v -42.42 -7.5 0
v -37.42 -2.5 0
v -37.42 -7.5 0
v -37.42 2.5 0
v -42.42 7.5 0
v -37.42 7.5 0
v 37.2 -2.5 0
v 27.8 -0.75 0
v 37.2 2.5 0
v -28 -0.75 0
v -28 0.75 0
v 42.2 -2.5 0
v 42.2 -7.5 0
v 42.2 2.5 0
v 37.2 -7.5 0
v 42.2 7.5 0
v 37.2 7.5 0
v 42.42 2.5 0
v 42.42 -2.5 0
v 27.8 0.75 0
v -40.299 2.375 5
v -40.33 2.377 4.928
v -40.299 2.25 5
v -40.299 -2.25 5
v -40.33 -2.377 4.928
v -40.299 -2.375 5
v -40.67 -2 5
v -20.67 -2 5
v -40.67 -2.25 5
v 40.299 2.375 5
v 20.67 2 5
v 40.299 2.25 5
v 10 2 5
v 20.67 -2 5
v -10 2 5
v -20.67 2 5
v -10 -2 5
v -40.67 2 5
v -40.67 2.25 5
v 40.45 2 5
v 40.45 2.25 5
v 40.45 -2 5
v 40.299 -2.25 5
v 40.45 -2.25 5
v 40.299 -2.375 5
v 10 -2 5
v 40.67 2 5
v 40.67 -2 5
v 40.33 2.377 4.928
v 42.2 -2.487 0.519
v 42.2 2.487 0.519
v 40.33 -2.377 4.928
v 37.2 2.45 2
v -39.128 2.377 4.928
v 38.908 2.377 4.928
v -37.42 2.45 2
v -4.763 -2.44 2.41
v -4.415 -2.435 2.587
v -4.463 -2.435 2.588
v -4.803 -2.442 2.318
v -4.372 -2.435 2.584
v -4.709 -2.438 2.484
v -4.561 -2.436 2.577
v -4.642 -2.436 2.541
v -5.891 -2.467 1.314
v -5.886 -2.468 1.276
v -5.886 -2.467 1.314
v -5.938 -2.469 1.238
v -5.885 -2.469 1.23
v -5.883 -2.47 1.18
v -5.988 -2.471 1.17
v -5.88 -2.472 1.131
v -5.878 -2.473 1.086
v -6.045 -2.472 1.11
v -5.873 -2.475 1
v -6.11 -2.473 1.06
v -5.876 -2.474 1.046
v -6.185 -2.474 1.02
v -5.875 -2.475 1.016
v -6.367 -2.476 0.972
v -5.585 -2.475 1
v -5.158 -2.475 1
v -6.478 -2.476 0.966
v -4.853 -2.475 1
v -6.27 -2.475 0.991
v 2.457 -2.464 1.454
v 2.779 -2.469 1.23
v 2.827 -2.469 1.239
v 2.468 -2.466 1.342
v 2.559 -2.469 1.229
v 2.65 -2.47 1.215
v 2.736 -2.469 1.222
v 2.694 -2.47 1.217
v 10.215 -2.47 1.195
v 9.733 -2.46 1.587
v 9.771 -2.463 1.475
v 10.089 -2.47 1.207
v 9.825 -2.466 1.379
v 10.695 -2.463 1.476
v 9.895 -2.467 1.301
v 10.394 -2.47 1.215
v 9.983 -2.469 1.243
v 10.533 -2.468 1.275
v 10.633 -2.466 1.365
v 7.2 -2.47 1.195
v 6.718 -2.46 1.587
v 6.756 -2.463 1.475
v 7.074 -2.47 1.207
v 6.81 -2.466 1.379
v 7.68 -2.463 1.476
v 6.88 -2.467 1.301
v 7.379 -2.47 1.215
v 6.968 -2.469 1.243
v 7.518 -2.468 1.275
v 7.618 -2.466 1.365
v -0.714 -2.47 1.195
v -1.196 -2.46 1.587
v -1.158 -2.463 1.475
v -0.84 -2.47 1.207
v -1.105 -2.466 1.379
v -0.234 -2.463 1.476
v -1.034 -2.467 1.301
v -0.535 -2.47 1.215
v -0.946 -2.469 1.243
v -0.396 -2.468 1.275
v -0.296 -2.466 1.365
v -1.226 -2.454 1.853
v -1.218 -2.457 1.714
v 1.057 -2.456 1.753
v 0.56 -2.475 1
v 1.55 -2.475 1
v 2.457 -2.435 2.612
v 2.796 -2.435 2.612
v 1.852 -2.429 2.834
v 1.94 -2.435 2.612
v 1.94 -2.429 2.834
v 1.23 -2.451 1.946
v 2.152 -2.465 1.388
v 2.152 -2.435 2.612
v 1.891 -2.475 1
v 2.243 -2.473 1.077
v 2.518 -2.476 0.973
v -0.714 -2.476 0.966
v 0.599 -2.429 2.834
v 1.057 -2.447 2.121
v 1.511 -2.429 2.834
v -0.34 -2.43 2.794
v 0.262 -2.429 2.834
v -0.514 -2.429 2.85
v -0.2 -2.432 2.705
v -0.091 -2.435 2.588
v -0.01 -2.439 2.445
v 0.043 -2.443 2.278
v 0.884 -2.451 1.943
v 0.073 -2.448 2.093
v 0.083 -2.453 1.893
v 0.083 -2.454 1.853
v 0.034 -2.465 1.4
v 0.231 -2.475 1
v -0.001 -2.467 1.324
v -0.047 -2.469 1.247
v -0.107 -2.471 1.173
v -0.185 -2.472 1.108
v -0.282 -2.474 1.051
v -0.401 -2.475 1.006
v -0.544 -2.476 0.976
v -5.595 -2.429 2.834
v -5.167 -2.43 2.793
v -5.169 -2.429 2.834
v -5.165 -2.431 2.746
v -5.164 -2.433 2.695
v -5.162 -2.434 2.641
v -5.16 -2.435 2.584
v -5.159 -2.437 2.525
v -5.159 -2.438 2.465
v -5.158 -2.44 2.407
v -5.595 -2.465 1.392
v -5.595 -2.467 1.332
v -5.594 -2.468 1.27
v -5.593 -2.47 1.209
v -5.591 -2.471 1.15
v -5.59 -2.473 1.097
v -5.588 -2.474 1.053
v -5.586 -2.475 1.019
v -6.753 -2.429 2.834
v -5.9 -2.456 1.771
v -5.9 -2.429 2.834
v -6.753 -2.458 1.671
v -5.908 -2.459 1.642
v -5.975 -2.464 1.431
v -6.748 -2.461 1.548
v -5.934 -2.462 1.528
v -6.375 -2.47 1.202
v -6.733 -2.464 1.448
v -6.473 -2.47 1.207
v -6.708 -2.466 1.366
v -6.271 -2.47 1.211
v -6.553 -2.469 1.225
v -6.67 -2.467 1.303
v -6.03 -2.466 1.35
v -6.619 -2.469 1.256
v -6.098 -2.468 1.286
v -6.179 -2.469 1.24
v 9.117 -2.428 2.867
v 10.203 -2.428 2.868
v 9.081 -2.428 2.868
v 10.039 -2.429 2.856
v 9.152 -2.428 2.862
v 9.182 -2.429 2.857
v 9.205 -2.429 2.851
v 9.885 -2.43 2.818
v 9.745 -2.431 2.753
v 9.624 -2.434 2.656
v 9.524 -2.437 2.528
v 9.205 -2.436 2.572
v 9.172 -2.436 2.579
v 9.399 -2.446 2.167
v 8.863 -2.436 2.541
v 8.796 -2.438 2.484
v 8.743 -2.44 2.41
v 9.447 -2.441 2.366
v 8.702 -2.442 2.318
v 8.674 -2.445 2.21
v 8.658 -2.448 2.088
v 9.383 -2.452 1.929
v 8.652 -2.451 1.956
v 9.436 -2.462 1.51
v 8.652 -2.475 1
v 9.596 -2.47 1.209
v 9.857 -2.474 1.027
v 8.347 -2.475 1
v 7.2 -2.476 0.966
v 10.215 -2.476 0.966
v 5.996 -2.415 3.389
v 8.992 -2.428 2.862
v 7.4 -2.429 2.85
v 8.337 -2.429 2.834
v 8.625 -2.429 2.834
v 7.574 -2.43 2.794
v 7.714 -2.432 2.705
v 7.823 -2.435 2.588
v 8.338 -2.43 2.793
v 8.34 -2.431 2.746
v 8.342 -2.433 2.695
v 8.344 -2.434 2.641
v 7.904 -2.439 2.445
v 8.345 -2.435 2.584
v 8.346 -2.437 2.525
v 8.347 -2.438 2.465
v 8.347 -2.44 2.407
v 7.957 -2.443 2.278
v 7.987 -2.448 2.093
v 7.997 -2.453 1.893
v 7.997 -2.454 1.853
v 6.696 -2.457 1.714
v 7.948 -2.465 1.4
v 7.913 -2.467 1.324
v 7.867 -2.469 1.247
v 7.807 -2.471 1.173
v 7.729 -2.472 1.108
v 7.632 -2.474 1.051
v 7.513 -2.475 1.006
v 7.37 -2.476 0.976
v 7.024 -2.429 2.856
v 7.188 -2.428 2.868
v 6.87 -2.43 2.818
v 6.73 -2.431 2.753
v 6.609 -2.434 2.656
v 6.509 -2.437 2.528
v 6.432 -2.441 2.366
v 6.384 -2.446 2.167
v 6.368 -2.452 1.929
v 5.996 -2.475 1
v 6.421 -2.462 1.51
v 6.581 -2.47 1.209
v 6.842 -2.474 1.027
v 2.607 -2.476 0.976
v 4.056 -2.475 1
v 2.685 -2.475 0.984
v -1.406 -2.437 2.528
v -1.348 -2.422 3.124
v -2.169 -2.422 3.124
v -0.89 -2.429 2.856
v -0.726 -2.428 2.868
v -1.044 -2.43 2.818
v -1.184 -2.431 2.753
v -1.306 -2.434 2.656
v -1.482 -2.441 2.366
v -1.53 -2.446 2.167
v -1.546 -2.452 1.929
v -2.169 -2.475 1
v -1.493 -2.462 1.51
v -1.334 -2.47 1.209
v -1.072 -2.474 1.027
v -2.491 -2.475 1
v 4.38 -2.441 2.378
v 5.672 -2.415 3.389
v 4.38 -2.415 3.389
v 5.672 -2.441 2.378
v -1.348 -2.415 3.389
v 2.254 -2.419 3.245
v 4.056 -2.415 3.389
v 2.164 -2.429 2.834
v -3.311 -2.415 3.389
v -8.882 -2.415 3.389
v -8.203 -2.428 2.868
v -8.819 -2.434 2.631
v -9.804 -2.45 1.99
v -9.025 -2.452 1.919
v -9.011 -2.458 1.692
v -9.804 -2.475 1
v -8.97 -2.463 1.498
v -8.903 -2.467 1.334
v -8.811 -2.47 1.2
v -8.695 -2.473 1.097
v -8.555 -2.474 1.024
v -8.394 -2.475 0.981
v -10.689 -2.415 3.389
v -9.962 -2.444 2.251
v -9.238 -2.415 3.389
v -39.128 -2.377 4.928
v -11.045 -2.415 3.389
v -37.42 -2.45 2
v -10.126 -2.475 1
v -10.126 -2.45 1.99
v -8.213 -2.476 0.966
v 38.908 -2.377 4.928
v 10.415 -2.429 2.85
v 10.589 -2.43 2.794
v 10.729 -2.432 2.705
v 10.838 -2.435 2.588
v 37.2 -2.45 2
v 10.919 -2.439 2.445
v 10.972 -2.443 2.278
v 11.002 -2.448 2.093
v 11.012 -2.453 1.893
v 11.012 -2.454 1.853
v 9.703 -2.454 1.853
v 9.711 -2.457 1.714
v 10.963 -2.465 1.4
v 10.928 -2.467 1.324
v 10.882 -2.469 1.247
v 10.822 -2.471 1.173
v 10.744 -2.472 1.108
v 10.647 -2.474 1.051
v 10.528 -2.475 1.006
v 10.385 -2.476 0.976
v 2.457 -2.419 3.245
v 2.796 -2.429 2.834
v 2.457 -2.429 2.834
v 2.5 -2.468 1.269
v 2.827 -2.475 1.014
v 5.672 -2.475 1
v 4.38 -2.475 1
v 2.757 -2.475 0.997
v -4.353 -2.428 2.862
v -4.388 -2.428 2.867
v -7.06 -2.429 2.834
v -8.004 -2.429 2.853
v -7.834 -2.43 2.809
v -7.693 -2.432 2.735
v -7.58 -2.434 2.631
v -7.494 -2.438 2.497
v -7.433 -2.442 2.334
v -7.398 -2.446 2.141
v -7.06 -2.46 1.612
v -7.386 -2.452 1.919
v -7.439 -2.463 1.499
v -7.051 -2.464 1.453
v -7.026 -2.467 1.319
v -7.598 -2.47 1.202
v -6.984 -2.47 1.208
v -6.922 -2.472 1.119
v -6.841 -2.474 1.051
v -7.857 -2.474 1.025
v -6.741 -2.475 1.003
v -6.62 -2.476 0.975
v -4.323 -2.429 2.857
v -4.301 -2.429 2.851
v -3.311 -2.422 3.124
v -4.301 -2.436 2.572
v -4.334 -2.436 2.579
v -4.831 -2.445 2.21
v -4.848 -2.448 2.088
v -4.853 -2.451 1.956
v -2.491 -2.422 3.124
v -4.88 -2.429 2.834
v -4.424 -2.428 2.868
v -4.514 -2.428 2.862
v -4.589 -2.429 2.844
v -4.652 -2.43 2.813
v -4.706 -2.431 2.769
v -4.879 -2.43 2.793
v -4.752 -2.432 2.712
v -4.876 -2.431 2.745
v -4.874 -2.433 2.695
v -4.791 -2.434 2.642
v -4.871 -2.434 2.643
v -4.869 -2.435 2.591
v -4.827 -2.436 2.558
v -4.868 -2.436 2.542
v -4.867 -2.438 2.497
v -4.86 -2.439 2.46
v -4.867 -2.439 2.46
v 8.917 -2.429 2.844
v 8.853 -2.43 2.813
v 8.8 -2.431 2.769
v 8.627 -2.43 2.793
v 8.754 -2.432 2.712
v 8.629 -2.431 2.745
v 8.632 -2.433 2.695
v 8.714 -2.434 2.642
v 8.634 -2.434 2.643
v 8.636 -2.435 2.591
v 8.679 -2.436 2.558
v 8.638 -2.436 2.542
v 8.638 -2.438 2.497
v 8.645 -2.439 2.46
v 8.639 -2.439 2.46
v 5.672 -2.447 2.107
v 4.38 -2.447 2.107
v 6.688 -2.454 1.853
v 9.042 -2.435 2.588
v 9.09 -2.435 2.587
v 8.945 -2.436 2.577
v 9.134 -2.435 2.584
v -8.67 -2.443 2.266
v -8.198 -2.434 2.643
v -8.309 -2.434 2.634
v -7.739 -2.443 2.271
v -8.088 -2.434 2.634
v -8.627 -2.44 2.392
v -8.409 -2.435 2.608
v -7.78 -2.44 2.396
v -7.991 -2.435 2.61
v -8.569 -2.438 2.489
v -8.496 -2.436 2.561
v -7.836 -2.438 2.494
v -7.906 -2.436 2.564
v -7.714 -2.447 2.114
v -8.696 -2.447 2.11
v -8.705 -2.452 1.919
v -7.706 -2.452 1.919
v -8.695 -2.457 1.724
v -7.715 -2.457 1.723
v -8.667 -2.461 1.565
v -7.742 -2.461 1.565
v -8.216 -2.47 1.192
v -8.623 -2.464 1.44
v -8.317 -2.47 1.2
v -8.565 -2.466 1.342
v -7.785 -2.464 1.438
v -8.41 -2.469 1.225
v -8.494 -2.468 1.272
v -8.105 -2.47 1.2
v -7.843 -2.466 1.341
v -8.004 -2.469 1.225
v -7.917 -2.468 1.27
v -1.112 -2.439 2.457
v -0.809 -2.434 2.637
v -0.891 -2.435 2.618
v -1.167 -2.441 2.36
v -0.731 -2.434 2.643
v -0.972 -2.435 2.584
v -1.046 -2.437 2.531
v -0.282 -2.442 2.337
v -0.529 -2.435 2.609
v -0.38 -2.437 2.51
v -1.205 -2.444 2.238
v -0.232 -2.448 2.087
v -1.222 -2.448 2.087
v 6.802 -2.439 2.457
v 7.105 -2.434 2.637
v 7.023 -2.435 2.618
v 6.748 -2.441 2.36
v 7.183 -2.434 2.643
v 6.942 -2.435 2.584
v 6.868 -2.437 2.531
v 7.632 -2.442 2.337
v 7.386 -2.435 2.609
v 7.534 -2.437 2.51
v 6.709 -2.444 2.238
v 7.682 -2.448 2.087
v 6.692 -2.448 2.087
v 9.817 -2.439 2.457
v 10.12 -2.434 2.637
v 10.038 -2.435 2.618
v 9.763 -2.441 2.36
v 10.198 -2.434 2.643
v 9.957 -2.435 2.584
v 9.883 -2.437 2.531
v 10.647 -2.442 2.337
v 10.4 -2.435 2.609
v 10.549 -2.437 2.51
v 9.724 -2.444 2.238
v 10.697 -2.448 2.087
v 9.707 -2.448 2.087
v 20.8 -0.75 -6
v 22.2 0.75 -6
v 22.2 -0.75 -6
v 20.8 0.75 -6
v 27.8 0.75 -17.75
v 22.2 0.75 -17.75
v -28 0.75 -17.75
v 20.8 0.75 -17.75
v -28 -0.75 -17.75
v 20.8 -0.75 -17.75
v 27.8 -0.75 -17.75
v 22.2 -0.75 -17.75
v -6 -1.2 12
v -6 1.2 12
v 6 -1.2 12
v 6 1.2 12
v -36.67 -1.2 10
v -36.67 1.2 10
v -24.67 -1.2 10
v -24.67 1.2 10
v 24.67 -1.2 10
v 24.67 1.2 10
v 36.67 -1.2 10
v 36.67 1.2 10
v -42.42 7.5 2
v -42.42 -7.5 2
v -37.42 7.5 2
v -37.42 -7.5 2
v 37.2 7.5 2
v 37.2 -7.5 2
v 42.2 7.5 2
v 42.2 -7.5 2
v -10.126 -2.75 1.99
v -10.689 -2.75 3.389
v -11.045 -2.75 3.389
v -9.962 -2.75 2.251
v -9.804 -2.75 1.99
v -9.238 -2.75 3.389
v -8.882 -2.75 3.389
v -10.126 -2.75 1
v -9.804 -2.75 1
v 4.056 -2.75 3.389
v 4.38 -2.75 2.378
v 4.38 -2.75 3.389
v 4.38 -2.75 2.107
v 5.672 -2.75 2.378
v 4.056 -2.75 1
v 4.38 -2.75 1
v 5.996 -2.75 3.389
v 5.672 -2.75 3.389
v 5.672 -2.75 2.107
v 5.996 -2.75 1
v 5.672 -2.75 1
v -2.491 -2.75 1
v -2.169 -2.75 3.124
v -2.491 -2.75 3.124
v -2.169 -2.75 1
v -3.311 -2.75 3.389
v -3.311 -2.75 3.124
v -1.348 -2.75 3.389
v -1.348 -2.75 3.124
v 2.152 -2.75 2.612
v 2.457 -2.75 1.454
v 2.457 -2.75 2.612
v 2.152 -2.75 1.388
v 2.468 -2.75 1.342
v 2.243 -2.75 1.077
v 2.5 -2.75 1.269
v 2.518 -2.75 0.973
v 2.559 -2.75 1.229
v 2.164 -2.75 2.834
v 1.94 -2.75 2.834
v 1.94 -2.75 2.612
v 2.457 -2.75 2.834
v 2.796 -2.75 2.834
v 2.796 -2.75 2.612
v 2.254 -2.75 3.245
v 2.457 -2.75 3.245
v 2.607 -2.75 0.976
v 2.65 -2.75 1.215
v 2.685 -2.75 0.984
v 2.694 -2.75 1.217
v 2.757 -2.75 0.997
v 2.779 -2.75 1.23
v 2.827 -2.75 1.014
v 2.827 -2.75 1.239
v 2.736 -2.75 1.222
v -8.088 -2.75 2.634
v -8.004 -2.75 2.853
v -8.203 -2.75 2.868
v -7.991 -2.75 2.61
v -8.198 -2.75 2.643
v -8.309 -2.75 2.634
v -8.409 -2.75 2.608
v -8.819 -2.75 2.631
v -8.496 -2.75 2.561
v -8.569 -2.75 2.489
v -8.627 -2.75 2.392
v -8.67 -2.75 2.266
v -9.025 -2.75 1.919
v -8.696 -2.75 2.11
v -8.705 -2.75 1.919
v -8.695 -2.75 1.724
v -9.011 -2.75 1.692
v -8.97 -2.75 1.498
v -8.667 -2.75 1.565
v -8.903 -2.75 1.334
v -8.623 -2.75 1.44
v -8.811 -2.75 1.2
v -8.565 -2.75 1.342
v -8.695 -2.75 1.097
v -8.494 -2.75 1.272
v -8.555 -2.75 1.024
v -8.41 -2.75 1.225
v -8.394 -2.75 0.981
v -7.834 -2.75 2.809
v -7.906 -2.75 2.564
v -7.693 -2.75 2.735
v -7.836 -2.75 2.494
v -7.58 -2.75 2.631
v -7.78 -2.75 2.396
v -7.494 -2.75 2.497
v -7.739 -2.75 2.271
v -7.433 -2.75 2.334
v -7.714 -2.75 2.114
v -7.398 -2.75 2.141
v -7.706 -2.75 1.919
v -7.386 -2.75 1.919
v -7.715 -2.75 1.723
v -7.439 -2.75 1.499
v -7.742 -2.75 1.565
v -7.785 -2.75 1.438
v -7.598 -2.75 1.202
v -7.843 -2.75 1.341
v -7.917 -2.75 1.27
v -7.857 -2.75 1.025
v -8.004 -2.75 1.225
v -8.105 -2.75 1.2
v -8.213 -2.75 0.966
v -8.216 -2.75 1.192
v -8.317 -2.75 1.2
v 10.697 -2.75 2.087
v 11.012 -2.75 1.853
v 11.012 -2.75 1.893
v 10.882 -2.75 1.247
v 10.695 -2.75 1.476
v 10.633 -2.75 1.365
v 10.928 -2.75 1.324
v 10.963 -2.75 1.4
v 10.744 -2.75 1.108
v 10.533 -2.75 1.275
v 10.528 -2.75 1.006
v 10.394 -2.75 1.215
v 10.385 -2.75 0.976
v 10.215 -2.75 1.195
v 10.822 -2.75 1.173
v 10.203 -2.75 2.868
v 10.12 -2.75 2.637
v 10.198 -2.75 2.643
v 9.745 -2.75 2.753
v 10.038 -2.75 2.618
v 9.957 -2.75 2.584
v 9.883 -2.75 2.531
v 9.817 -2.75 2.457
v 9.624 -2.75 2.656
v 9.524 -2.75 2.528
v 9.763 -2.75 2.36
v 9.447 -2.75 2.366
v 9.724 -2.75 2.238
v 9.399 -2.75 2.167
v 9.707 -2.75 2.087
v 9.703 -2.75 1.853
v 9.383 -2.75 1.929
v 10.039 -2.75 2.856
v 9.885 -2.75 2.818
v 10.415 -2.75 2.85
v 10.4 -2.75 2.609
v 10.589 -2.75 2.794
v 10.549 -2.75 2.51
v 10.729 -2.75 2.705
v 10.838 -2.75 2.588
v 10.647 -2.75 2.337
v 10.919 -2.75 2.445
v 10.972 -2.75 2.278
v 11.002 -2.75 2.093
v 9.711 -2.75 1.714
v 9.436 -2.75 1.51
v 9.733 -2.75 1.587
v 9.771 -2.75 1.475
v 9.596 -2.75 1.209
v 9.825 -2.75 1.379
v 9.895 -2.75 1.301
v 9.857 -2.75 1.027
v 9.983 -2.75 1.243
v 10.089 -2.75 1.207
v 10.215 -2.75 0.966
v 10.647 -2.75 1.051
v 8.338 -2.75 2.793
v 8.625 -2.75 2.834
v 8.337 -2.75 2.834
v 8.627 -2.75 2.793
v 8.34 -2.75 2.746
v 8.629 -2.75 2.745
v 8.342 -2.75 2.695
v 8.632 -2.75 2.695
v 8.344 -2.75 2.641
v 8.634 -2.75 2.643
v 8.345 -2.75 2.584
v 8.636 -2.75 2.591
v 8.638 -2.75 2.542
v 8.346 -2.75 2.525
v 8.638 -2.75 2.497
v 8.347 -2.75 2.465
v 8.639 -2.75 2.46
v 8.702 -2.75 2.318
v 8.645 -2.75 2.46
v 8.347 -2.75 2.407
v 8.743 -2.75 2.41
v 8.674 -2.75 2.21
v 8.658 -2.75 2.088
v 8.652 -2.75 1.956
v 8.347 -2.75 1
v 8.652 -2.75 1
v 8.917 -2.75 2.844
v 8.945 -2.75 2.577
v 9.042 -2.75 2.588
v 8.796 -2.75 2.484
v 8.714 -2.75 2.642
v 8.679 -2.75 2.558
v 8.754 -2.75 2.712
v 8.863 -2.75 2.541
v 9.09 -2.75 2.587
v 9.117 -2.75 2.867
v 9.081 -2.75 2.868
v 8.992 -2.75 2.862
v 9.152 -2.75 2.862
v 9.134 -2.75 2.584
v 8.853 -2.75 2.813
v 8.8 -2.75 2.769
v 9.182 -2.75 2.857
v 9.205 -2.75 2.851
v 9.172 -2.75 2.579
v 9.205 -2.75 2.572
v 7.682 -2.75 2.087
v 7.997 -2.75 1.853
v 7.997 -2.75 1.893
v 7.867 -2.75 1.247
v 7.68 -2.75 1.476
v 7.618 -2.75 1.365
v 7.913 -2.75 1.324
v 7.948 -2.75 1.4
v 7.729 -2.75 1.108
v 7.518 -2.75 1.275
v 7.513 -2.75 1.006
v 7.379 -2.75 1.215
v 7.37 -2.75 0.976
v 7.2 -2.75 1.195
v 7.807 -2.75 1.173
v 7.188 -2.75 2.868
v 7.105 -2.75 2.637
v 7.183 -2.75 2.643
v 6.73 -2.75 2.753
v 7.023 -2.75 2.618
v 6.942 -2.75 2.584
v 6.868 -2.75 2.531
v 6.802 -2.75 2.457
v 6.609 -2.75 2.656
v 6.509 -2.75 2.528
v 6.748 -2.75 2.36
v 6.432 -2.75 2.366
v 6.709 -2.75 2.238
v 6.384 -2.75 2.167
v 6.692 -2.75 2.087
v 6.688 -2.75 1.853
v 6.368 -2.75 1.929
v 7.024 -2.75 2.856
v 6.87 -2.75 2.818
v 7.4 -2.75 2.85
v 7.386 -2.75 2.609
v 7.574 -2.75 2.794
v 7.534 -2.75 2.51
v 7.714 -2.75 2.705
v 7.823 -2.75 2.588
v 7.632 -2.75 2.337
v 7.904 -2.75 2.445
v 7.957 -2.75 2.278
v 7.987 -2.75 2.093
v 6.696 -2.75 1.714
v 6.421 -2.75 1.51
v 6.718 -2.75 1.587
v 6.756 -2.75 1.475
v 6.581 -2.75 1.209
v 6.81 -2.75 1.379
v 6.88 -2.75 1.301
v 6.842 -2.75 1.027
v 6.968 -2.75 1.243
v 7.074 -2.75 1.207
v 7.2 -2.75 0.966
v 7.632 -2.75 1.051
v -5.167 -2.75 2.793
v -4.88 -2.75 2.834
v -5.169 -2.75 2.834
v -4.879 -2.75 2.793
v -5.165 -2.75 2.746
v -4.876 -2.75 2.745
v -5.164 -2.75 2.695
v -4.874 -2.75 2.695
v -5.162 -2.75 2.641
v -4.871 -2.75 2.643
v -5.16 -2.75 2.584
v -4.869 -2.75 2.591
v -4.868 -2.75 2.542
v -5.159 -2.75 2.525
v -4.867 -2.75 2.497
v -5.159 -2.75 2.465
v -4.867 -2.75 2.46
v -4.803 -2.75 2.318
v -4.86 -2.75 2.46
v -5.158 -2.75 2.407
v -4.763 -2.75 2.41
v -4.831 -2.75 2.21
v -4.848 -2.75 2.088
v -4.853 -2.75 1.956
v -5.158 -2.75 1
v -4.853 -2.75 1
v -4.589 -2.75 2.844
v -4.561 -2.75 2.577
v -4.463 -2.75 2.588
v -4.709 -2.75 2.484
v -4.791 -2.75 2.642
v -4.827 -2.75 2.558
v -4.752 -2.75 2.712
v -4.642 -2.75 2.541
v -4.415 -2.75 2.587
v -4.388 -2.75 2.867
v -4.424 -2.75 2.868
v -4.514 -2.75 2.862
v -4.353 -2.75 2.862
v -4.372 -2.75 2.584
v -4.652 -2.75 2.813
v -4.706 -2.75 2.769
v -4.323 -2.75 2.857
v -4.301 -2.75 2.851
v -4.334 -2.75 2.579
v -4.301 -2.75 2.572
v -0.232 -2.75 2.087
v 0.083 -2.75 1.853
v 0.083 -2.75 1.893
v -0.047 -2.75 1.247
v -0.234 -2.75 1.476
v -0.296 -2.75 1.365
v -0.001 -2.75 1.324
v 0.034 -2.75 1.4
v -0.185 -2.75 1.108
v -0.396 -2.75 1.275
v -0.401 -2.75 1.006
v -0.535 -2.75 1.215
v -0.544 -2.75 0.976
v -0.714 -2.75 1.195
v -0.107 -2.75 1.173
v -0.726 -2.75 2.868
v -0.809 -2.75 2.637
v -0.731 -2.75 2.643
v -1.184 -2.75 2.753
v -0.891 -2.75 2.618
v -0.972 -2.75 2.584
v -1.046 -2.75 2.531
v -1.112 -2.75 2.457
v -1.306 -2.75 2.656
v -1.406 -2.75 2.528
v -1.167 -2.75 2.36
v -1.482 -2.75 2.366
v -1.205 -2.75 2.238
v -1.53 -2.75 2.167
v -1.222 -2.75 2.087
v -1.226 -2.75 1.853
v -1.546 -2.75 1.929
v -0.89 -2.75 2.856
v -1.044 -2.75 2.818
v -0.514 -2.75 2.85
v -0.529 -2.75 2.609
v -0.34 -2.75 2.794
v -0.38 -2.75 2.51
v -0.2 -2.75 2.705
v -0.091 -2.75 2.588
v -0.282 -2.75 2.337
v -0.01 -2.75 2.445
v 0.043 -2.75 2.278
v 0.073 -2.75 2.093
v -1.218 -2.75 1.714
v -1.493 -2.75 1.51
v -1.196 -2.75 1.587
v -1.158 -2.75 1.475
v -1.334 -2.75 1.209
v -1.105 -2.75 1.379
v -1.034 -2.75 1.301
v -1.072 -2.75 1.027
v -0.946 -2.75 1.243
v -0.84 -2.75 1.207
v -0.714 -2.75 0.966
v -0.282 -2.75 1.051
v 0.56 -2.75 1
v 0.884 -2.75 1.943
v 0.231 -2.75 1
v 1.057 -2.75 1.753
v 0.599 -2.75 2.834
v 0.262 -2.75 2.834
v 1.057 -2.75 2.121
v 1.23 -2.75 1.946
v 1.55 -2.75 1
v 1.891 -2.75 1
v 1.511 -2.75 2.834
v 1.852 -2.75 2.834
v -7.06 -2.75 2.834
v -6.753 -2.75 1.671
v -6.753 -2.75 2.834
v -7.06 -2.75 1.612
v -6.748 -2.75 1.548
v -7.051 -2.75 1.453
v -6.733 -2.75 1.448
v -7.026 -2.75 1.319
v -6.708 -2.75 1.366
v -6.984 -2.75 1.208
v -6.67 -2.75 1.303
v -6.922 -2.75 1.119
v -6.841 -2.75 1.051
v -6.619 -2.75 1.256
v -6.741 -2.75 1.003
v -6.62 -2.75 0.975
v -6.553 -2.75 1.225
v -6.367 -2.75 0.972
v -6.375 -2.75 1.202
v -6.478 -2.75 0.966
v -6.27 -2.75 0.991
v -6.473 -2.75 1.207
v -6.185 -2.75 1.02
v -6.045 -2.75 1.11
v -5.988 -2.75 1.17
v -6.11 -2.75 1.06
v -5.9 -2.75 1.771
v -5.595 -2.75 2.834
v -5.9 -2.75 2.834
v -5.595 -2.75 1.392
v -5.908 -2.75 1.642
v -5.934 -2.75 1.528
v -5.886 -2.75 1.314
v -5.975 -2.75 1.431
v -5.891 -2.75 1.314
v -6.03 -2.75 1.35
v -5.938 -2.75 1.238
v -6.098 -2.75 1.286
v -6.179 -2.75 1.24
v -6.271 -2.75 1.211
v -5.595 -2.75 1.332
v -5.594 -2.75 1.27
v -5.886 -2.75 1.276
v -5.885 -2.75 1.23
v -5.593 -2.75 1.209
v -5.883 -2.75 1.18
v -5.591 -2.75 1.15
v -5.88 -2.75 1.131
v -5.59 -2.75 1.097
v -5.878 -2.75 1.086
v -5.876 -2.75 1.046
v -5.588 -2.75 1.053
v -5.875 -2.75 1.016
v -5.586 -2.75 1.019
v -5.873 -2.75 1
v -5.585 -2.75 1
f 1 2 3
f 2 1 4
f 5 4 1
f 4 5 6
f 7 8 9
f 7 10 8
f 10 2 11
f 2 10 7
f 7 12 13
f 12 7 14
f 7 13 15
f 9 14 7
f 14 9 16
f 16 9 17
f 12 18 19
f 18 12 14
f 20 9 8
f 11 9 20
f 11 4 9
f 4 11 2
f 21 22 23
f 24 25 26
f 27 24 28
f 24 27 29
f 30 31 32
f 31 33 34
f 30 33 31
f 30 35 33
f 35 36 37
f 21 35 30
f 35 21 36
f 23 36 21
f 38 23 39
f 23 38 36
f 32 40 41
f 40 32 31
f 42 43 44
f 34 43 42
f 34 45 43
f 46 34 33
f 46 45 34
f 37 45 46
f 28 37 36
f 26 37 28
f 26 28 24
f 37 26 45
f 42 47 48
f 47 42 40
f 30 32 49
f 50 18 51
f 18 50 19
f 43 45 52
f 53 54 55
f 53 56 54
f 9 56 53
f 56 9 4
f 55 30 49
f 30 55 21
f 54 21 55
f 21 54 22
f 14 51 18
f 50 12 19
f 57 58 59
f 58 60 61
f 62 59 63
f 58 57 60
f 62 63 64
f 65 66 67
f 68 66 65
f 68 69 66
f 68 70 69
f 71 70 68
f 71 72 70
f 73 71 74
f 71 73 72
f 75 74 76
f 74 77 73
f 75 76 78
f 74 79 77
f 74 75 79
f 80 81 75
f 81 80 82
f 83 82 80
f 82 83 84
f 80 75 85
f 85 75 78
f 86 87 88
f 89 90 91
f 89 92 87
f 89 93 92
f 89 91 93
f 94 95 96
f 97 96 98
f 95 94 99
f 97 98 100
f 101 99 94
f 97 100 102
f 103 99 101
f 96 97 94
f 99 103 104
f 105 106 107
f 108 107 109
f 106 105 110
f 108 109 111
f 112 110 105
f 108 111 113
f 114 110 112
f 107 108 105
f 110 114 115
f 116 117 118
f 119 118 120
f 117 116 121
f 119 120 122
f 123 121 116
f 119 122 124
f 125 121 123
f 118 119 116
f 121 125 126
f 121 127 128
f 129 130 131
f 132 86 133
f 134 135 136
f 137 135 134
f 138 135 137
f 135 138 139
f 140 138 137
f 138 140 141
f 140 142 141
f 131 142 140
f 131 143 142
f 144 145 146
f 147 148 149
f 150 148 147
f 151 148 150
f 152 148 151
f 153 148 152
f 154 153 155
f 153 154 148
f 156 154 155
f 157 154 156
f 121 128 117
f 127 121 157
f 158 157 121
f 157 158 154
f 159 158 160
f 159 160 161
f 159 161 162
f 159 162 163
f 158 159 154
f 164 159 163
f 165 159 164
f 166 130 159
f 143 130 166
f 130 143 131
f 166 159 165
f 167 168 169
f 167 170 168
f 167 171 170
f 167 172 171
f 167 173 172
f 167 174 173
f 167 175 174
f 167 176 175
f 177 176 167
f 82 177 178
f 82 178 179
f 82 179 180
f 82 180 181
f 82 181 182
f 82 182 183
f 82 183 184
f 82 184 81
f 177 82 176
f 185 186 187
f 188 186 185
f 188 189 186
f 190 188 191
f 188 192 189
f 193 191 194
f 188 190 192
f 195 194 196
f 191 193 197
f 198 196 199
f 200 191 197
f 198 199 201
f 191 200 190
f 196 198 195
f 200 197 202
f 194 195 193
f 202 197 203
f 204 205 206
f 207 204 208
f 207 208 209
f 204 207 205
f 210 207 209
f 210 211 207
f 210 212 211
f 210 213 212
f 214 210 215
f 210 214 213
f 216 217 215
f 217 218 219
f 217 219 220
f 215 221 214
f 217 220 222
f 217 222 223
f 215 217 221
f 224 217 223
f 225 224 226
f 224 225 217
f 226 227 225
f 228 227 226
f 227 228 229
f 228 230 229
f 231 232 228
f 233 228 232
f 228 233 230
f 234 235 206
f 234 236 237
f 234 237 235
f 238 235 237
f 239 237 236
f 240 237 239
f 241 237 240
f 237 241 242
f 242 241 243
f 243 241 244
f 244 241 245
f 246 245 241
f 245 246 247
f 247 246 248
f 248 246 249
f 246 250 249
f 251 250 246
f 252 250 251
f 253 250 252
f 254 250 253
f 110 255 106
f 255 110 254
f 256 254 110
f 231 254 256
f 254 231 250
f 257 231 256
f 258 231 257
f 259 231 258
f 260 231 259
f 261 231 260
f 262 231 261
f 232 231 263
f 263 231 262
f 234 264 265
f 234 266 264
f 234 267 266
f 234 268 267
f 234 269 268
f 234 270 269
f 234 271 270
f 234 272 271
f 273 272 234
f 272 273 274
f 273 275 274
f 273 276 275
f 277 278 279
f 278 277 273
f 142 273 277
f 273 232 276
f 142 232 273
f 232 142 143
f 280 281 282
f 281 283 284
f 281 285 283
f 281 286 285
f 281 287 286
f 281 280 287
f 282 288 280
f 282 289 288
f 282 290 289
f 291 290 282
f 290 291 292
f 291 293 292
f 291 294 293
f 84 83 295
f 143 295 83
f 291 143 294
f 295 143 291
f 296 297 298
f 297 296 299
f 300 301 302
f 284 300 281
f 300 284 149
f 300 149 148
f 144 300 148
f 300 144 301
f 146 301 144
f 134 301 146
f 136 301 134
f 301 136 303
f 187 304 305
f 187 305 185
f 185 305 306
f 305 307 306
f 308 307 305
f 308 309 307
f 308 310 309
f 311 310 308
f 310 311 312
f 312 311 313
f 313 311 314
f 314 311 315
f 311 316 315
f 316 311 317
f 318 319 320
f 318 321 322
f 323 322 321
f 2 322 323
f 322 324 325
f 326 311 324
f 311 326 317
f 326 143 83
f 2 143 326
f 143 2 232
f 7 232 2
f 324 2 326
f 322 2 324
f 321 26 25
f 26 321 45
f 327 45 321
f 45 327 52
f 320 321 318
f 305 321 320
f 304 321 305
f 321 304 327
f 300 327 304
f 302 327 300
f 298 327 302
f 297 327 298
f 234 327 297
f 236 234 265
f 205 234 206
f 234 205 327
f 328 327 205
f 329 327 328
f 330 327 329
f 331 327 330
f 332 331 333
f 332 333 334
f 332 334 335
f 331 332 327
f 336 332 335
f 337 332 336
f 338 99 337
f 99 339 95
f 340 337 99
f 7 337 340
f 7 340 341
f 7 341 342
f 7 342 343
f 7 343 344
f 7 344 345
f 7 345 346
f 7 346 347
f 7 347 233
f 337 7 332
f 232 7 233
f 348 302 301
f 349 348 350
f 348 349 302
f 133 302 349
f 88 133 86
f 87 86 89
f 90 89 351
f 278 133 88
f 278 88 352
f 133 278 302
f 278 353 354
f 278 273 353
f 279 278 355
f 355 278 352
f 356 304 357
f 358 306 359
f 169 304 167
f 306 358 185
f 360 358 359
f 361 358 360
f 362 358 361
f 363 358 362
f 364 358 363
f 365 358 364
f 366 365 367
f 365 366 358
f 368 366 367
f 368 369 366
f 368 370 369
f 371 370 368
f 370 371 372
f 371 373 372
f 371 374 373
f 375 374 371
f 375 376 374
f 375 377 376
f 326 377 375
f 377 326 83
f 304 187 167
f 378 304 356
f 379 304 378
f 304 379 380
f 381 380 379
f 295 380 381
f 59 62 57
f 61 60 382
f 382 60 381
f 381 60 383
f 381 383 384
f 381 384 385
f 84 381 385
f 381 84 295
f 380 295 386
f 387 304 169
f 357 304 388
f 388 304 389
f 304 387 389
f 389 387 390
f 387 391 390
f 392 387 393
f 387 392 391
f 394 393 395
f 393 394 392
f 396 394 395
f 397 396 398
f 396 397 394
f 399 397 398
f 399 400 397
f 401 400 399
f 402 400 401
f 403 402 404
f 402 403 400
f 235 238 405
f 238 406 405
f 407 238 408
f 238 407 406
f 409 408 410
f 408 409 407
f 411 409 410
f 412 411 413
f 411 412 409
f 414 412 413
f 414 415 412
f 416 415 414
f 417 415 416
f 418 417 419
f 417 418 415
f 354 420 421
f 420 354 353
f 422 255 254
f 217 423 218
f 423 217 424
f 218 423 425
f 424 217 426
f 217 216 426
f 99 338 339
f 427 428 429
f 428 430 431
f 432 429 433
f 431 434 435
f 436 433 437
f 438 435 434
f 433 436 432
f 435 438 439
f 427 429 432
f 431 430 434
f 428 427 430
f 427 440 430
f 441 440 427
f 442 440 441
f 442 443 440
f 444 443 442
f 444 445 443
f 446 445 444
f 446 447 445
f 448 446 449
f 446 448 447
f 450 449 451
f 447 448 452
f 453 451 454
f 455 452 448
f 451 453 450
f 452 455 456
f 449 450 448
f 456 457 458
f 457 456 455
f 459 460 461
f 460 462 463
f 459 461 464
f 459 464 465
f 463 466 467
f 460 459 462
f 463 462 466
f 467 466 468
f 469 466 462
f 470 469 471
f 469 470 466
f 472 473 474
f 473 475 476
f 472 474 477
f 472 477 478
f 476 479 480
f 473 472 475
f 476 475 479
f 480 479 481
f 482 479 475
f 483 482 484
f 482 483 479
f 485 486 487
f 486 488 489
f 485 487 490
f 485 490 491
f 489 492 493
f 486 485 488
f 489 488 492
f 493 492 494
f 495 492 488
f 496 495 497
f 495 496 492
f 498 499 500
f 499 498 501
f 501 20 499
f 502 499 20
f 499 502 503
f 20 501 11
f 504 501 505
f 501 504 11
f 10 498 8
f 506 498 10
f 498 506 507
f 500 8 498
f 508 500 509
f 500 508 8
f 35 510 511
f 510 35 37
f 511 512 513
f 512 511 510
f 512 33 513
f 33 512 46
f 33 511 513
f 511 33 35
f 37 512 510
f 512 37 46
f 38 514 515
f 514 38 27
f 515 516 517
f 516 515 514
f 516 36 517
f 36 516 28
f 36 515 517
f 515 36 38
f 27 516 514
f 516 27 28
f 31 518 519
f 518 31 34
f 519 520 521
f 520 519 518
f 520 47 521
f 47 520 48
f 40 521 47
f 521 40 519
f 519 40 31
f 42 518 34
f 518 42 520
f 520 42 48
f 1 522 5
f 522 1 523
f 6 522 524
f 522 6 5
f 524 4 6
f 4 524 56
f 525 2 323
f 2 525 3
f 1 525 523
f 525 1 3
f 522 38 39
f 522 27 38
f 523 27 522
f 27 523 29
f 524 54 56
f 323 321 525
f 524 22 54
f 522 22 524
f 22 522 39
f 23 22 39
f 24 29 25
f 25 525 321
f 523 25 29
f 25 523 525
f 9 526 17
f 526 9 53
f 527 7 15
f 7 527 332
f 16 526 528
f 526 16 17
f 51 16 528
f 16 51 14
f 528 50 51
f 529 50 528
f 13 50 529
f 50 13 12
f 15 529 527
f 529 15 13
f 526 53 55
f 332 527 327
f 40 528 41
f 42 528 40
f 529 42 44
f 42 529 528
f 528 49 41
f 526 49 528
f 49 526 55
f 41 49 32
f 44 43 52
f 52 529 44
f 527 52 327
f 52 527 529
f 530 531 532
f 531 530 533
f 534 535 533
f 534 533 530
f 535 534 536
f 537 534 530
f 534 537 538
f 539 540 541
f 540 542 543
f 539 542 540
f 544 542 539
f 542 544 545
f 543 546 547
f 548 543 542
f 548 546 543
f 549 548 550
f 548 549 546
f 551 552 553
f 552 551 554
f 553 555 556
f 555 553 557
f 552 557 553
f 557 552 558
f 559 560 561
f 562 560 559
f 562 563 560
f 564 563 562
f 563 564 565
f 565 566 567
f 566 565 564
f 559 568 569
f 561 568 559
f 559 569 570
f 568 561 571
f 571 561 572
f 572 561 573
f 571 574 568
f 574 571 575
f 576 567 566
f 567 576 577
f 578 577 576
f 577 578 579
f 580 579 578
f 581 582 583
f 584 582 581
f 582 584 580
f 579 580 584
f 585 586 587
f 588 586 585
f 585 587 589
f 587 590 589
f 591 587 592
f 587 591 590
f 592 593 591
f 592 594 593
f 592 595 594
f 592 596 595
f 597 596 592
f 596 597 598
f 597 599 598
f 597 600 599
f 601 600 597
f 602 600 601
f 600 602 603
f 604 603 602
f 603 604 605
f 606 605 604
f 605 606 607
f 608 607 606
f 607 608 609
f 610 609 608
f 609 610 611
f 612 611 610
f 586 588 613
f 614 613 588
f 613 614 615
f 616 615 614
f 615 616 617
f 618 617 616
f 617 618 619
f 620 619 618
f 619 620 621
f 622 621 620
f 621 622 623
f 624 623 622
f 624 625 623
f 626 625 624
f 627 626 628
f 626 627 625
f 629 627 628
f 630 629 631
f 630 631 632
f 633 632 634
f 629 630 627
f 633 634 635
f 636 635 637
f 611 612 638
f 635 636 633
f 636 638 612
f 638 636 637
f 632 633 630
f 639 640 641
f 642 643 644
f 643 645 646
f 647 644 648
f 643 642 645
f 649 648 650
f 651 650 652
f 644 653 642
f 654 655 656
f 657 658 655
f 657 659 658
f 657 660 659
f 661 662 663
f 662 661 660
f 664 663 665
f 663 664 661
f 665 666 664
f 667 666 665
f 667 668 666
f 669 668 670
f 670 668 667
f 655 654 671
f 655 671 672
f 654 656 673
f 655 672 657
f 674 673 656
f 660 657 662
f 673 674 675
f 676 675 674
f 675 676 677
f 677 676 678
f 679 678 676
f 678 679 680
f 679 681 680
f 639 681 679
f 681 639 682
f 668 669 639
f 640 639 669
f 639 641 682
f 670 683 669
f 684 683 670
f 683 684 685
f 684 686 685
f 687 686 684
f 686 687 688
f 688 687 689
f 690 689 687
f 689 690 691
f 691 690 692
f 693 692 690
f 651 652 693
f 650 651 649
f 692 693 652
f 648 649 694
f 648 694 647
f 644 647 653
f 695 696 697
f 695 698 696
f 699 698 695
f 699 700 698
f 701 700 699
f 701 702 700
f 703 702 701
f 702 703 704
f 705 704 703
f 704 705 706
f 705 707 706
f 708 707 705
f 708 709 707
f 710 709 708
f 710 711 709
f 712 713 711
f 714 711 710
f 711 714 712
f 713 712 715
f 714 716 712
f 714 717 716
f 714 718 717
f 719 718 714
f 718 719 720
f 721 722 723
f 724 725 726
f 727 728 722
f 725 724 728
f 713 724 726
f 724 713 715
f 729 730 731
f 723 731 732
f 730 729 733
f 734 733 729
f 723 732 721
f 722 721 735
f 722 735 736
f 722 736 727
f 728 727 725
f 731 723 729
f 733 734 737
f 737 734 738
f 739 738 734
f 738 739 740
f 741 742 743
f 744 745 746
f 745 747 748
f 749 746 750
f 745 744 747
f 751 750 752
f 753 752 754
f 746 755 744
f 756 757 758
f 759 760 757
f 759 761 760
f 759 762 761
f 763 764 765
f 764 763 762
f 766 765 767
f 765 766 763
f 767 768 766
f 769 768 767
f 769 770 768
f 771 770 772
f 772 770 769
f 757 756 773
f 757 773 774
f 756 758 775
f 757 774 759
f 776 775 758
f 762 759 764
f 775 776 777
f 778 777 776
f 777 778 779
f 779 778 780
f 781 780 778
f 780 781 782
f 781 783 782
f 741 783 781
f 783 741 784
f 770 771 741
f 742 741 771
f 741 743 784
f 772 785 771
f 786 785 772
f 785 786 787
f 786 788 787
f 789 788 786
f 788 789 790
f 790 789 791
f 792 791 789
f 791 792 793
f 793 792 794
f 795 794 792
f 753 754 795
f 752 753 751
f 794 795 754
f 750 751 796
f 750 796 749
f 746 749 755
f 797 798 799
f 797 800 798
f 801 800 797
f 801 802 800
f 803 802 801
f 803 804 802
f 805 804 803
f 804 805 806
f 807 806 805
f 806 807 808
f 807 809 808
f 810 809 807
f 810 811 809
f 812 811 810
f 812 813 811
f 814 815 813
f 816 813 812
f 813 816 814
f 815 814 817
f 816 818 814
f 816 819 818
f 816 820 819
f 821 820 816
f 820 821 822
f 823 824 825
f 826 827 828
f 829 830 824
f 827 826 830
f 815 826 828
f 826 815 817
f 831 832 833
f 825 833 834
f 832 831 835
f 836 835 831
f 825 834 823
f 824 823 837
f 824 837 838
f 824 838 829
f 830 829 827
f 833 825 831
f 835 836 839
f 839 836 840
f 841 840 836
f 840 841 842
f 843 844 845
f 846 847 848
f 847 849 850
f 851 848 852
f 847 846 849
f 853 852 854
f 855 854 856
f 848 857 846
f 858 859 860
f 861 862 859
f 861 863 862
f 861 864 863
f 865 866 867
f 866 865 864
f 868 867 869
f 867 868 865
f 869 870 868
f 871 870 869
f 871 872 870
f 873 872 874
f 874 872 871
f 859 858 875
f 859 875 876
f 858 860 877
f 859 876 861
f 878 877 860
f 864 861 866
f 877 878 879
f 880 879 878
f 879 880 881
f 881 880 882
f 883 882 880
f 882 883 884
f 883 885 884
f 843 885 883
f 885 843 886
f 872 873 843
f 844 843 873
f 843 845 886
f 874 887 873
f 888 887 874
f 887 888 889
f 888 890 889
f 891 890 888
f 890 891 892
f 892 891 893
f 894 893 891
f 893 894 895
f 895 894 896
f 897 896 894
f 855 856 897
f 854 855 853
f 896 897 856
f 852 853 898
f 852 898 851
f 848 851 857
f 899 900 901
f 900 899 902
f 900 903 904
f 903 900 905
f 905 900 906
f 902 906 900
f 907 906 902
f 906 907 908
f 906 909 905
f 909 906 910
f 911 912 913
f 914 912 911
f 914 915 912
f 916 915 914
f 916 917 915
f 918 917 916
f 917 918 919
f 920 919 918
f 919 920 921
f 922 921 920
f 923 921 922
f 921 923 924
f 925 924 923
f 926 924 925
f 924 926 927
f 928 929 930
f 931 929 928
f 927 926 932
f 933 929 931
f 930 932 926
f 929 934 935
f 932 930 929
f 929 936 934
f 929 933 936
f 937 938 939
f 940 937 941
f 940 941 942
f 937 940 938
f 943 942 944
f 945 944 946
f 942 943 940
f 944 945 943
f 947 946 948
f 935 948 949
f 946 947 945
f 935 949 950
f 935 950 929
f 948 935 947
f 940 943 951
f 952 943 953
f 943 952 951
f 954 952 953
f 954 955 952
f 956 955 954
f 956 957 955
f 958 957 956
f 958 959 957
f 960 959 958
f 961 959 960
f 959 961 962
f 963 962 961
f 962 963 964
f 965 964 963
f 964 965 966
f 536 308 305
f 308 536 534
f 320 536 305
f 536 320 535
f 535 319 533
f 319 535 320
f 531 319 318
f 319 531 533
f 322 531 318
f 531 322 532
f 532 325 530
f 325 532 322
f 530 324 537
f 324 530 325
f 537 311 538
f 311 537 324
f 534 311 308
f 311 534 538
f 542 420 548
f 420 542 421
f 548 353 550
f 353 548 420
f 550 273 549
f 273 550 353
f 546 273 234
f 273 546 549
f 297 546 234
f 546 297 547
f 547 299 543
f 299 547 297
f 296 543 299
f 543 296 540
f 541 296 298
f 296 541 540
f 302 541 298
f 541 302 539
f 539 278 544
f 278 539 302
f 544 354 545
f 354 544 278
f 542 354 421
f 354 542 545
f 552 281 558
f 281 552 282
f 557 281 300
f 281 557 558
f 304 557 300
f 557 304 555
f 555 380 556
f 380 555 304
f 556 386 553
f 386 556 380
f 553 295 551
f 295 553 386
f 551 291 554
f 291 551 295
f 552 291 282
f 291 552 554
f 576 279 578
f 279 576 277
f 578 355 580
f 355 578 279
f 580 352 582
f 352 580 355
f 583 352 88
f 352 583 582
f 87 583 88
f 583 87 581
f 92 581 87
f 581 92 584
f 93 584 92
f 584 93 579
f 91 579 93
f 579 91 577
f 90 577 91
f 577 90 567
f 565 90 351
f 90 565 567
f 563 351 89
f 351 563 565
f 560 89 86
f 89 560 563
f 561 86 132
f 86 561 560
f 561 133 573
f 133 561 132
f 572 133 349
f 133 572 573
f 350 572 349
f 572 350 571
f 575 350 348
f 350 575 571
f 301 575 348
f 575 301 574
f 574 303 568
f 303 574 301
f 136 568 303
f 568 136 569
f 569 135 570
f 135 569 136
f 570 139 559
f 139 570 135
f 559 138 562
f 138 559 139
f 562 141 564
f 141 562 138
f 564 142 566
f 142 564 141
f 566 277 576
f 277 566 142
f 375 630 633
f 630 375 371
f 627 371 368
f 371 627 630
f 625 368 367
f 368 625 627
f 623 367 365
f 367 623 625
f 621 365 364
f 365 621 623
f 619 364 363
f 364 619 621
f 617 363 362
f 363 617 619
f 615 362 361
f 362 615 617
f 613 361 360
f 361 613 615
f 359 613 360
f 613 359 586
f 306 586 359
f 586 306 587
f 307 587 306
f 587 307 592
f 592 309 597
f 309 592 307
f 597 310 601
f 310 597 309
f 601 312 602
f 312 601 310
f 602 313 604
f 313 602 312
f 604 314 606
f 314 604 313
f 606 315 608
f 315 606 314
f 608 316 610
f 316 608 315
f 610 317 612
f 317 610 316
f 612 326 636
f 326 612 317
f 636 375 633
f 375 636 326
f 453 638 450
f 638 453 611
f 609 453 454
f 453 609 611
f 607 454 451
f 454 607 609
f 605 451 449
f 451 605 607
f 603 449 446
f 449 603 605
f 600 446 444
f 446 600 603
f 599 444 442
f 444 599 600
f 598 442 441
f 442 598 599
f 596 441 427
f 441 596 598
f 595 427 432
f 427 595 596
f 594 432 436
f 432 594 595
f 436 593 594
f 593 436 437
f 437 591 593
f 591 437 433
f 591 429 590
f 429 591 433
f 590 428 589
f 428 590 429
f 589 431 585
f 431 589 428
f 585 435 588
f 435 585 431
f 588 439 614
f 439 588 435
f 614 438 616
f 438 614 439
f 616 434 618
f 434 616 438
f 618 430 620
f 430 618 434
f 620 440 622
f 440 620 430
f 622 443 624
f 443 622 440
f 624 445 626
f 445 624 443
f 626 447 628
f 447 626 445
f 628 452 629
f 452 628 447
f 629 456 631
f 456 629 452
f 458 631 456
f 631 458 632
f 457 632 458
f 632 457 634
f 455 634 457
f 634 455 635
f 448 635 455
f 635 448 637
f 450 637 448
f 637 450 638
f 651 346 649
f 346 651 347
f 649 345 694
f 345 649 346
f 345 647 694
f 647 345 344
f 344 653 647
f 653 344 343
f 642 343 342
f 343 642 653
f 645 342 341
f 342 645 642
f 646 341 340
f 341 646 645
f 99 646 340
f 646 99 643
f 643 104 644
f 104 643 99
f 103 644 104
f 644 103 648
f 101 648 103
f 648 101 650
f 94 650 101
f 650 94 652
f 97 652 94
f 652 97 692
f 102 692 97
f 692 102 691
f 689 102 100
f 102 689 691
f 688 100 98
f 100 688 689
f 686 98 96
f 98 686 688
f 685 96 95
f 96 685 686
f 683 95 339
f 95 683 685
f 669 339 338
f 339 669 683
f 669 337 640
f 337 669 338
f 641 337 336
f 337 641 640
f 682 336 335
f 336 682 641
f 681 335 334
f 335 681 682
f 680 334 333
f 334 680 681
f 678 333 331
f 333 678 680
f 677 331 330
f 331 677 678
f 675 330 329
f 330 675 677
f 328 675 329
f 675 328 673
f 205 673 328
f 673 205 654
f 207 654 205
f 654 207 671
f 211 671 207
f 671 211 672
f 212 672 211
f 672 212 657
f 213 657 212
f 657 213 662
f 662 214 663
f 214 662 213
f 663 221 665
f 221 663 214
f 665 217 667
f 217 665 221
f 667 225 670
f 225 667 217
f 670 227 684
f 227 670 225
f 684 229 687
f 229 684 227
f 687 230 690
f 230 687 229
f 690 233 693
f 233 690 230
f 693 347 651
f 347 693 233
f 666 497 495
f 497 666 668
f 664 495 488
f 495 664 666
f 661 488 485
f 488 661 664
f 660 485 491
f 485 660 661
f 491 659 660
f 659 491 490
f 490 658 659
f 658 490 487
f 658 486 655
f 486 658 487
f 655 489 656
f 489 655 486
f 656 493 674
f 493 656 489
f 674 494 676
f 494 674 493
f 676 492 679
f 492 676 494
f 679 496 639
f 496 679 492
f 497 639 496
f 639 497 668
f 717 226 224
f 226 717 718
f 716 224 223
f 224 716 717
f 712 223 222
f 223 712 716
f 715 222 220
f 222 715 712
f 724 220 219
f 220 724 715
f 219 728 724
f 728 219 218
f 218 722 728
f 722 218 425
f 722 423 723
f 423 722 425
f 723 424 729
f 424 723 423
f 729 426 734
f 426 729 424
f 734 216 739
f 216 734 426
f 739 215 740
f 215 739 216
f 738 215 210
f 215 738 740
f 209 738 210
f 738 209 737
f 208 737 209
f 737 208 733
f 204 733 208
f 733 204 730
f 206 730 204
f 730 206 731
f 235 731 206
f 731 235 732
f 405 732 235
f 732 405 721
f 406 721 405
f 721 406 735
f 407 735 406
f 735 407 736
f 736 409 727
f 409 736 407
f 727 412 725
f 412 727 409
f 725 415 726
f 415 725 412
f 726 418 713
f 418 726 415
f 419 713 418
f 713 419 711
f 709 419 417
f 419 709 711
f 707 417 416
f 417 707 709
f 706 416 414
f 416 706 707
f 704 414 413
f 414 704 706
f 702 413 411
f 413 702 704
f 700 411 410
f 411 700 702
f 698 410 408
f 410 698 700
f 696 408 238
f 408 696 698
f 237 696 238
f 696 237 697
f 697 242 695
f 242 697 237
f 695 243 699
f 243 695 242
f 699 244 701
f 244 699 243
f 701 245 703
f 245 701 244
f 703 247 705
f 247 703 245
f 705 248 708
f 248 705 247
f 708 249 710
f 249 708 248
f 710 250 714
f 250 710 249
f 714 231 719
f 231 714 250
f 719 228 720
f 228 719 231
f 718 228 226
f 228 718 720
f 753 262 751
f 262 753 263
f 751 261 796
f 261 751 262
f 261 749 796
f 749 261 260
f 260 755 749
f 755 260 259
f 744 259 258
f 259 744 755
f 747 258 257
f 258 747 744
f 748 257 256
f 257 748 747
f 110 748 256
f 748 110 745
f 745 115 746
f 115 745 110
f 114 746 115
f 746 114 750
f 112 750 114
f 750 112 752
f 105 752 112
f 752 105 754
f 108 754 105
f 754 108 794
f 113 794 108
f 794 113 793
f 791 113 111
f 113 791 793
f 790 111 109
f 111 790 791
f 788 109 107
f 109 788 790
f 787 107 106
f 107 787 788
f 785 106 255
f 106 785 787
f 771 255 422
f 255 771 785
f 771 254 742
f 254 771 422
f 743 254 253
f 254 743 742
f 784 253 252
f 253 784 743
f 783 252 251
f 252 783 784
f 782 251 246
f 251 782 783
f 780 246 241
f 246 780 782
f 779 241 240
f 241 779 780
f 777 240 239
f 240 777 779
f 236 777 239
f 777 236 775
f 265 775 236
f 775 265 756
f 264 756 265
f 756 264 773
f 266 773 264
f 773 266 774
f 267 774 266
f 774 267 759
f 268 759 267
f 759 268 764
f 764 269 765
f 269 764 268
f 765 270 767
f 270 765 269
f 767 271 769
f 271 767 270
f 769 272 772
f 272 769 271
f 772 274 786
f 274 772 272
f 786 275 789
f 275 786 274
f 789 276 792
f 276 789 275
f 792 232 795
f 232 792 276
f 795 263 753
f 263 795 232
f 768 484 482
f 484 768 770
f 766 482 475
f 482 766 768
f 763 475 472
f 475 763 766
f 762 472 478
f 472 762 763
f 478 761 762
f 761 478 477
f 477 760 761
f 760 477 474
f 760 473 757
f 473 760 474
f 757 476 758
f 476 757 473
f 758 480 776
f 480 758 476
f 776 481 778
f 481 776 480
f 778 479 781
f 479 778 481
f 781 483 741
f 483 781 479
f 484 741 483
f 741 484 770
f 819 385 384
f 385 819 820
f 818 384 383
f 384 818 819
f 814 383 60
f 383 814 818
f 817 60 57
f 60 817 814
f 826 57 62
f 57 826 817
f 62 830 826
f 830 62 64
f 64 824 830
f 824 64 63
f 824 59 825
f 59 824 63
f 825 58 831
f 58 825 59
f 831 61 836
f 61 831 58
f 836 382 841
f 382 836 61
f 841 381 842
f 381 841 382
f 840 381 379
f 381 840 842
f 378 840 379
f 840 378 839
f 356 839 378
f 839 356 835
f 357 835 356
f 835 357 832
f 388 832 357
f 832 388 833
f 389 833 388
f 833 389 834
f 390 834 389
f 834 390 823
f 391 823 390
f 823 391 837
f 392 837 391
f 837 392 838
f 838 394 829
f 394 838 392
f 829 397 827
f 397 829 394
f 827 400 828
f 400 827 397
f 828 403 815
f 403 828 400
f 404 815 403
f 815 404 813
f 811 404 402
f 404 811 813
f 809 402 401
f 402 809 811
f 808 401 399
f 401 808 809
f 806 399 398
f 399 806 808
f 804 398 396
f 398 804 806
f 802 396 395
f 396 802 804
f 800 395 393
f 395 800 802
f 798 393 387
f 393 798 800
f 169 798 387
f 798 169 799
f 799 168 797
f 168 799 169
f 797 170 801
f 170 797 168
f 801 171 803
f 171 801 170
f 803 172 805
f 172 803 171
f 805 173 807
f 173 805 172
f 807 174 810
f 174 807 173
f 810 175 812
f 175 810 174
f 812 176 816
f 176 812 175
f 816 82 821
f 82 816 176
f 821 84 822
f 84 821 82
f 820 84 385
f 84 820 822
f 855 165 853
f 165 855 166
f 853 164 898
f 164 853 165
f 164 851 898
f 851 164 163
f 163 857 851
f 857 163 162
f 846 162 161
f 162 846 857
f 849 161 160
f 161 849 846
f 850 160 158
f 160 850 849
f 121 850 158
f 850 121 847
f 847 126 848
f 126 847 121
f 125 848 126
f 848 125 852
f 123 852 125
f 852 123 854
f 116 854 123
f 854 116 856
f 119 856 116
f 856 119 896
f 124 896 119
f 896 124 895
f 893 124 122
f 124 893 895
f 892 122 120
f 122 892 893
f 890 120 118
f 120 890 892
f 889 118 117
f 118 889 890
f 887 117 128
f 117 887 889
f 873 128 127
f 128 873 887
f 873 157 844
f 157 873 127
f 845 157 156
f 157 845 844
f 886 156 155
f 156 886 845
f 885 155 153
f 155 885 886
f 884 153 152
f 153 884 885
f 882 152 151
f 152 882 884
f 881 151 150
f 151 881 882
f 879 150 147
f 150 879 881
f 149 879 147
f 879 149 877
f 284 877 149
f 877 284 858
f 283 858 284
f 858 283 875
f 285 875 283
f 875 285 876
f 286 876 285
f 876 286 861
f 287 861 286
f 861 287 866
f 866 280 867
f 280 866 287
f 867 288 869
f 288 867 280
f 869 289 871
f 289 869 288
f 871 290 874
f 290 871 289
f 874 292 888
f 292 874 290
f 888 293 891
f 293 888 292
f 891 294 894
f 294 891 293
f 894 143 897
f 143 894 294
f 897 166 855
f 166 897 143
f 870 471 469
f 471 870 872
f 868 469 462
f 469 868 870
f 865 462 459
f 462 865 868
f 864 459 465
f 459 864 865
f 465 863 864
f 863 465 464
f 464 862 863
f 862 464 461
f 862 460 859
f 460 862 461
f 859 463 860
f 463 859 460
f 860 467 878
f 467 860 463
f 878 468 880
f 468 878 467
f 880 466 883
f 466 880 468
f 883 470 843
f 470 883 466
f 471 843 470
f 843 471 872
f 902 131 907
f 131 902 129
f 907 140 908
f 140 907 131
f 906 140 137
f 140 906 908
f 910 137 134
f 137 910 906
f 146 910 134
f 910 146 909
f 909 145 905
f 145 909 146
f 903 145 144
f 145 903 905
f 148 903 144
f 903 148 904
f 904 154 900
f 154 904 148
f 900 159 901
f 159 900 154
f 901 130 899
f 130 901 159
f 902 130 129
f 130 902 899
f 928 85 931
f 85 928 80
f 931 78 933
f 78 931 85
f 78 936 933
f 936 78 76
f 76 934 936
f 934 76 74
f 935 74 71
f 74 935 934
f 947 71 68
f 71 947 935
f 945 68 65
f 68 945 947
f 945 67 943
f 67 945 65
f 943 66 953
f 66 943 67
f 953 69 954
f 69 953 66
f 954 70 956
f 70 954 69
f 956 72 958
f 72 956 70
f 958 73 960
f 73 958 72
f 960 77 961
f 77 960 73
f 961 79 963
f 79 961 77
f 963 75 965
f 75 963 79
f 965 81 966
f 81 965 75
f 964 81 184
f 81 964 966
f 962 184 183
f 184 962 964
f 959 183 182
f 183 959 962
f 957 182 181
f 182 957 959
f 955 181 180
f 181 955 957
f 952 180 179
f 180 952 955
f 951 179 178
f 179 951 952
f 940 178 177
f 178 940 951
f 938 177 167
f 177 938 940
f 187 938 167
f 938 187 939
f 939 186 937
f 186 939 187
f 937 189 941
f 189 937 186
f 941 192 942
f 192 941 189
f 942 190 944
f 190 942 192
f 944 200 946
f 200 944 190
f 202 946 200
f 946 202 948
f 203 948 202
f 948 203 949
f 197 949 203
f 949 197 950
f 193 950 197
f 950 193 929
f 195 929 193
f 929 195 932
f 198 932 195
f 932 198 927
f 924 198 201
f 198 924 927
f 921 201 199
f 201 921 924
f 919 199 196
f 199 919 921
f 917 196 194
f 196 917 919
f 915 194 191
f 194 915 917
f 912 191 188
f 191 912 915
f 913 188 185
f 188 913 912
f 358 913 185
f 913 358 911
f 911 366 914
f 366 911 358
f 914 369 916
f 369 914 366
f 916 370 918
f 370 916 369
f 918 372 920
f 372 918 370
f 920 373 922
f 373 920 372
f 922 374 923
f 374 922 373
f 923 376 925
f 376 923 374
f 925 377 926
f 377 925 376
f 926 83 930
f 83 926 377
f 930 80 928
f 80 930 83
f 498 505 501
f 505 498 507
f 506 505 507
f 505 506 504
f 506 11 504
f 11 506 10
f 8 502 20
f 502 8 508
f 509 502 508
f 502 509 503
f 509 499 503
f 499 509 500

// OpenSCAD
echo(version=version());
// Parameters used to generate model (Values are measured in mm)

tooth_count = 1; // Number of wells
tooth_width = 48.8; // Width of each tooth
tooth_thickness = 1.5; // Thickness of each tooth
tooth_gap = 1.6; // Spacing between teeth.
tooth_length = 17.75;  // Length of teeth (measured perpendicular from bottom of support)
text_label = "Your Text Here"; // Label or name you want to appear on the side
tooth_support = 6;// Height of upper support on teeth

// Include square blocks on bottom of support
locking_block_supports = "no"; // [yes, no]

//Main block of code
union() {

// Primary support bar
    translate([0, 0, 0])
    linear_extrude(height = 5, scale = 0.95)
    square([body_x, body_y], center = true);

// Teeth support
    translate([0, 0, -tooth_support])
    linear_extrude(height = tooth_support)
    square([55, tooth_thickness], center = true);

//Handles
     // Handle Center
        translate([0, 0, body_z])
        linear_extrude(height = 7, scale = 0.6)
        square([20, 4], center = true);
    // Handle left
        translate([(-body_x/2)+11.75, 0, body_z])
        linear_extrude(height = 5, scale = 0.6)
        square([20, 4], center = true);
    // Handle right
        translate([(body_x/2)-11.75, 0, body_z])
        linear_extrude(height = 5, scale = 0.6)
        square([20, 4], center = true);

// Left support square
	// Support base
        translate([(-body_x/2)+2.5, 0, 0])
    	linear_extrude(height = 2)
    	square([5, 15], center = true);
	// Angled Support
        translate([(-body_x/2)+2.5, 0, 2])
        linear_extrude(height = 3, scale = 0.3)
        square([5, 15], center = true);

// Right support square
	// Support base
        translate([(body_x/2)-support_x, 0, 0])
    	linear_extrude(height = 2)
    	square([5, 15], center = true);
    // Angled Support
        translate([(body_x/2)-support_x, 0, 2])
        linear_extrude(height = 3, scale = 0.3)
        square([5, 15], center = true);

// Text placed on body of comb
    logo(text_label);

// Locking Blocks.
	if(locking_block_supports == "yes")
	{

    // Right
        translate([(body_x/2)-support_x, 0, -support_z]) linear_extrude(height = support_z) square([support_x, support_y], center = false);

    // Left
        translate([-body_x/2, 0, -support_z]) linear_extrude(height = support_z) square([support_x, support_y], center = false);
	}

//Teeth
	translate([(tooth_margin-3.6), 0, -tooth_length/2]) union() {
		for(i = [0:tooth_count-1]) {
			translate([i * (tooth_width + tooth_gap), 0, 0])
            //color("red")
            cube([tooth_width, tooth_thickness, tooth_length], center=true);
		}
	}
    	translate([25, 0, -tooth_length/2]) union() {
            //color("blue")
		for(i = [0:0]) {
			translate([i * (5.6 + tooth_gap), 0, 0])
            cube([5.6, tooth_thickness, tooth_length], center=true);
		}
	}
}

body_x = 84.84;
body_z = 5;
body_y = 5;

support_x = 2.72;
support_y = 2.55;
support_z = 2.64;

tooth_margin = -(((tooth_count-1)*tooth_width)/2+((tooth_count-1)*tooth_gap)/2);

module logo(t, s = 2.5, style = "") {
  translate([0, -body_y/2+.75, 1])
    rotate([90, 0, 0]) color("red")
    linear_extrude(height = 1)
    text(t, size = s, font = str("Liberation Sans", style),  halign = "center");
}
/*
* Customizable Electrophoresis Comb
*
* Copyright (c) 2016 Adm Chrysler
* www.admchrysler.com / chrysler@cornell.edu
* Licensed under the Creative Commons
* Attribution - Non-Commercial - Share Alike license.
*
*/
